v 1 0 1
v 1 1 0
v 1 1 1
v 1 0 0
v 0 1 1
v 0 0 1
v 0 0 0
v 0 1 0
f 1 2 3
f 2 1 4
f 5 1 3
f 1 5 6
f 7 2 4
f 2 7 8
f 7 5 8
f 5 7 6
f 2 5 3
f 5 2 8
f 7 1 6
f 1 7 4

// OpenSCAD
color("#ff0000") cube();
color("#f00") cube();
color("#ff000080") cube();
color("#f008") cube();
color("#12345") cube();
